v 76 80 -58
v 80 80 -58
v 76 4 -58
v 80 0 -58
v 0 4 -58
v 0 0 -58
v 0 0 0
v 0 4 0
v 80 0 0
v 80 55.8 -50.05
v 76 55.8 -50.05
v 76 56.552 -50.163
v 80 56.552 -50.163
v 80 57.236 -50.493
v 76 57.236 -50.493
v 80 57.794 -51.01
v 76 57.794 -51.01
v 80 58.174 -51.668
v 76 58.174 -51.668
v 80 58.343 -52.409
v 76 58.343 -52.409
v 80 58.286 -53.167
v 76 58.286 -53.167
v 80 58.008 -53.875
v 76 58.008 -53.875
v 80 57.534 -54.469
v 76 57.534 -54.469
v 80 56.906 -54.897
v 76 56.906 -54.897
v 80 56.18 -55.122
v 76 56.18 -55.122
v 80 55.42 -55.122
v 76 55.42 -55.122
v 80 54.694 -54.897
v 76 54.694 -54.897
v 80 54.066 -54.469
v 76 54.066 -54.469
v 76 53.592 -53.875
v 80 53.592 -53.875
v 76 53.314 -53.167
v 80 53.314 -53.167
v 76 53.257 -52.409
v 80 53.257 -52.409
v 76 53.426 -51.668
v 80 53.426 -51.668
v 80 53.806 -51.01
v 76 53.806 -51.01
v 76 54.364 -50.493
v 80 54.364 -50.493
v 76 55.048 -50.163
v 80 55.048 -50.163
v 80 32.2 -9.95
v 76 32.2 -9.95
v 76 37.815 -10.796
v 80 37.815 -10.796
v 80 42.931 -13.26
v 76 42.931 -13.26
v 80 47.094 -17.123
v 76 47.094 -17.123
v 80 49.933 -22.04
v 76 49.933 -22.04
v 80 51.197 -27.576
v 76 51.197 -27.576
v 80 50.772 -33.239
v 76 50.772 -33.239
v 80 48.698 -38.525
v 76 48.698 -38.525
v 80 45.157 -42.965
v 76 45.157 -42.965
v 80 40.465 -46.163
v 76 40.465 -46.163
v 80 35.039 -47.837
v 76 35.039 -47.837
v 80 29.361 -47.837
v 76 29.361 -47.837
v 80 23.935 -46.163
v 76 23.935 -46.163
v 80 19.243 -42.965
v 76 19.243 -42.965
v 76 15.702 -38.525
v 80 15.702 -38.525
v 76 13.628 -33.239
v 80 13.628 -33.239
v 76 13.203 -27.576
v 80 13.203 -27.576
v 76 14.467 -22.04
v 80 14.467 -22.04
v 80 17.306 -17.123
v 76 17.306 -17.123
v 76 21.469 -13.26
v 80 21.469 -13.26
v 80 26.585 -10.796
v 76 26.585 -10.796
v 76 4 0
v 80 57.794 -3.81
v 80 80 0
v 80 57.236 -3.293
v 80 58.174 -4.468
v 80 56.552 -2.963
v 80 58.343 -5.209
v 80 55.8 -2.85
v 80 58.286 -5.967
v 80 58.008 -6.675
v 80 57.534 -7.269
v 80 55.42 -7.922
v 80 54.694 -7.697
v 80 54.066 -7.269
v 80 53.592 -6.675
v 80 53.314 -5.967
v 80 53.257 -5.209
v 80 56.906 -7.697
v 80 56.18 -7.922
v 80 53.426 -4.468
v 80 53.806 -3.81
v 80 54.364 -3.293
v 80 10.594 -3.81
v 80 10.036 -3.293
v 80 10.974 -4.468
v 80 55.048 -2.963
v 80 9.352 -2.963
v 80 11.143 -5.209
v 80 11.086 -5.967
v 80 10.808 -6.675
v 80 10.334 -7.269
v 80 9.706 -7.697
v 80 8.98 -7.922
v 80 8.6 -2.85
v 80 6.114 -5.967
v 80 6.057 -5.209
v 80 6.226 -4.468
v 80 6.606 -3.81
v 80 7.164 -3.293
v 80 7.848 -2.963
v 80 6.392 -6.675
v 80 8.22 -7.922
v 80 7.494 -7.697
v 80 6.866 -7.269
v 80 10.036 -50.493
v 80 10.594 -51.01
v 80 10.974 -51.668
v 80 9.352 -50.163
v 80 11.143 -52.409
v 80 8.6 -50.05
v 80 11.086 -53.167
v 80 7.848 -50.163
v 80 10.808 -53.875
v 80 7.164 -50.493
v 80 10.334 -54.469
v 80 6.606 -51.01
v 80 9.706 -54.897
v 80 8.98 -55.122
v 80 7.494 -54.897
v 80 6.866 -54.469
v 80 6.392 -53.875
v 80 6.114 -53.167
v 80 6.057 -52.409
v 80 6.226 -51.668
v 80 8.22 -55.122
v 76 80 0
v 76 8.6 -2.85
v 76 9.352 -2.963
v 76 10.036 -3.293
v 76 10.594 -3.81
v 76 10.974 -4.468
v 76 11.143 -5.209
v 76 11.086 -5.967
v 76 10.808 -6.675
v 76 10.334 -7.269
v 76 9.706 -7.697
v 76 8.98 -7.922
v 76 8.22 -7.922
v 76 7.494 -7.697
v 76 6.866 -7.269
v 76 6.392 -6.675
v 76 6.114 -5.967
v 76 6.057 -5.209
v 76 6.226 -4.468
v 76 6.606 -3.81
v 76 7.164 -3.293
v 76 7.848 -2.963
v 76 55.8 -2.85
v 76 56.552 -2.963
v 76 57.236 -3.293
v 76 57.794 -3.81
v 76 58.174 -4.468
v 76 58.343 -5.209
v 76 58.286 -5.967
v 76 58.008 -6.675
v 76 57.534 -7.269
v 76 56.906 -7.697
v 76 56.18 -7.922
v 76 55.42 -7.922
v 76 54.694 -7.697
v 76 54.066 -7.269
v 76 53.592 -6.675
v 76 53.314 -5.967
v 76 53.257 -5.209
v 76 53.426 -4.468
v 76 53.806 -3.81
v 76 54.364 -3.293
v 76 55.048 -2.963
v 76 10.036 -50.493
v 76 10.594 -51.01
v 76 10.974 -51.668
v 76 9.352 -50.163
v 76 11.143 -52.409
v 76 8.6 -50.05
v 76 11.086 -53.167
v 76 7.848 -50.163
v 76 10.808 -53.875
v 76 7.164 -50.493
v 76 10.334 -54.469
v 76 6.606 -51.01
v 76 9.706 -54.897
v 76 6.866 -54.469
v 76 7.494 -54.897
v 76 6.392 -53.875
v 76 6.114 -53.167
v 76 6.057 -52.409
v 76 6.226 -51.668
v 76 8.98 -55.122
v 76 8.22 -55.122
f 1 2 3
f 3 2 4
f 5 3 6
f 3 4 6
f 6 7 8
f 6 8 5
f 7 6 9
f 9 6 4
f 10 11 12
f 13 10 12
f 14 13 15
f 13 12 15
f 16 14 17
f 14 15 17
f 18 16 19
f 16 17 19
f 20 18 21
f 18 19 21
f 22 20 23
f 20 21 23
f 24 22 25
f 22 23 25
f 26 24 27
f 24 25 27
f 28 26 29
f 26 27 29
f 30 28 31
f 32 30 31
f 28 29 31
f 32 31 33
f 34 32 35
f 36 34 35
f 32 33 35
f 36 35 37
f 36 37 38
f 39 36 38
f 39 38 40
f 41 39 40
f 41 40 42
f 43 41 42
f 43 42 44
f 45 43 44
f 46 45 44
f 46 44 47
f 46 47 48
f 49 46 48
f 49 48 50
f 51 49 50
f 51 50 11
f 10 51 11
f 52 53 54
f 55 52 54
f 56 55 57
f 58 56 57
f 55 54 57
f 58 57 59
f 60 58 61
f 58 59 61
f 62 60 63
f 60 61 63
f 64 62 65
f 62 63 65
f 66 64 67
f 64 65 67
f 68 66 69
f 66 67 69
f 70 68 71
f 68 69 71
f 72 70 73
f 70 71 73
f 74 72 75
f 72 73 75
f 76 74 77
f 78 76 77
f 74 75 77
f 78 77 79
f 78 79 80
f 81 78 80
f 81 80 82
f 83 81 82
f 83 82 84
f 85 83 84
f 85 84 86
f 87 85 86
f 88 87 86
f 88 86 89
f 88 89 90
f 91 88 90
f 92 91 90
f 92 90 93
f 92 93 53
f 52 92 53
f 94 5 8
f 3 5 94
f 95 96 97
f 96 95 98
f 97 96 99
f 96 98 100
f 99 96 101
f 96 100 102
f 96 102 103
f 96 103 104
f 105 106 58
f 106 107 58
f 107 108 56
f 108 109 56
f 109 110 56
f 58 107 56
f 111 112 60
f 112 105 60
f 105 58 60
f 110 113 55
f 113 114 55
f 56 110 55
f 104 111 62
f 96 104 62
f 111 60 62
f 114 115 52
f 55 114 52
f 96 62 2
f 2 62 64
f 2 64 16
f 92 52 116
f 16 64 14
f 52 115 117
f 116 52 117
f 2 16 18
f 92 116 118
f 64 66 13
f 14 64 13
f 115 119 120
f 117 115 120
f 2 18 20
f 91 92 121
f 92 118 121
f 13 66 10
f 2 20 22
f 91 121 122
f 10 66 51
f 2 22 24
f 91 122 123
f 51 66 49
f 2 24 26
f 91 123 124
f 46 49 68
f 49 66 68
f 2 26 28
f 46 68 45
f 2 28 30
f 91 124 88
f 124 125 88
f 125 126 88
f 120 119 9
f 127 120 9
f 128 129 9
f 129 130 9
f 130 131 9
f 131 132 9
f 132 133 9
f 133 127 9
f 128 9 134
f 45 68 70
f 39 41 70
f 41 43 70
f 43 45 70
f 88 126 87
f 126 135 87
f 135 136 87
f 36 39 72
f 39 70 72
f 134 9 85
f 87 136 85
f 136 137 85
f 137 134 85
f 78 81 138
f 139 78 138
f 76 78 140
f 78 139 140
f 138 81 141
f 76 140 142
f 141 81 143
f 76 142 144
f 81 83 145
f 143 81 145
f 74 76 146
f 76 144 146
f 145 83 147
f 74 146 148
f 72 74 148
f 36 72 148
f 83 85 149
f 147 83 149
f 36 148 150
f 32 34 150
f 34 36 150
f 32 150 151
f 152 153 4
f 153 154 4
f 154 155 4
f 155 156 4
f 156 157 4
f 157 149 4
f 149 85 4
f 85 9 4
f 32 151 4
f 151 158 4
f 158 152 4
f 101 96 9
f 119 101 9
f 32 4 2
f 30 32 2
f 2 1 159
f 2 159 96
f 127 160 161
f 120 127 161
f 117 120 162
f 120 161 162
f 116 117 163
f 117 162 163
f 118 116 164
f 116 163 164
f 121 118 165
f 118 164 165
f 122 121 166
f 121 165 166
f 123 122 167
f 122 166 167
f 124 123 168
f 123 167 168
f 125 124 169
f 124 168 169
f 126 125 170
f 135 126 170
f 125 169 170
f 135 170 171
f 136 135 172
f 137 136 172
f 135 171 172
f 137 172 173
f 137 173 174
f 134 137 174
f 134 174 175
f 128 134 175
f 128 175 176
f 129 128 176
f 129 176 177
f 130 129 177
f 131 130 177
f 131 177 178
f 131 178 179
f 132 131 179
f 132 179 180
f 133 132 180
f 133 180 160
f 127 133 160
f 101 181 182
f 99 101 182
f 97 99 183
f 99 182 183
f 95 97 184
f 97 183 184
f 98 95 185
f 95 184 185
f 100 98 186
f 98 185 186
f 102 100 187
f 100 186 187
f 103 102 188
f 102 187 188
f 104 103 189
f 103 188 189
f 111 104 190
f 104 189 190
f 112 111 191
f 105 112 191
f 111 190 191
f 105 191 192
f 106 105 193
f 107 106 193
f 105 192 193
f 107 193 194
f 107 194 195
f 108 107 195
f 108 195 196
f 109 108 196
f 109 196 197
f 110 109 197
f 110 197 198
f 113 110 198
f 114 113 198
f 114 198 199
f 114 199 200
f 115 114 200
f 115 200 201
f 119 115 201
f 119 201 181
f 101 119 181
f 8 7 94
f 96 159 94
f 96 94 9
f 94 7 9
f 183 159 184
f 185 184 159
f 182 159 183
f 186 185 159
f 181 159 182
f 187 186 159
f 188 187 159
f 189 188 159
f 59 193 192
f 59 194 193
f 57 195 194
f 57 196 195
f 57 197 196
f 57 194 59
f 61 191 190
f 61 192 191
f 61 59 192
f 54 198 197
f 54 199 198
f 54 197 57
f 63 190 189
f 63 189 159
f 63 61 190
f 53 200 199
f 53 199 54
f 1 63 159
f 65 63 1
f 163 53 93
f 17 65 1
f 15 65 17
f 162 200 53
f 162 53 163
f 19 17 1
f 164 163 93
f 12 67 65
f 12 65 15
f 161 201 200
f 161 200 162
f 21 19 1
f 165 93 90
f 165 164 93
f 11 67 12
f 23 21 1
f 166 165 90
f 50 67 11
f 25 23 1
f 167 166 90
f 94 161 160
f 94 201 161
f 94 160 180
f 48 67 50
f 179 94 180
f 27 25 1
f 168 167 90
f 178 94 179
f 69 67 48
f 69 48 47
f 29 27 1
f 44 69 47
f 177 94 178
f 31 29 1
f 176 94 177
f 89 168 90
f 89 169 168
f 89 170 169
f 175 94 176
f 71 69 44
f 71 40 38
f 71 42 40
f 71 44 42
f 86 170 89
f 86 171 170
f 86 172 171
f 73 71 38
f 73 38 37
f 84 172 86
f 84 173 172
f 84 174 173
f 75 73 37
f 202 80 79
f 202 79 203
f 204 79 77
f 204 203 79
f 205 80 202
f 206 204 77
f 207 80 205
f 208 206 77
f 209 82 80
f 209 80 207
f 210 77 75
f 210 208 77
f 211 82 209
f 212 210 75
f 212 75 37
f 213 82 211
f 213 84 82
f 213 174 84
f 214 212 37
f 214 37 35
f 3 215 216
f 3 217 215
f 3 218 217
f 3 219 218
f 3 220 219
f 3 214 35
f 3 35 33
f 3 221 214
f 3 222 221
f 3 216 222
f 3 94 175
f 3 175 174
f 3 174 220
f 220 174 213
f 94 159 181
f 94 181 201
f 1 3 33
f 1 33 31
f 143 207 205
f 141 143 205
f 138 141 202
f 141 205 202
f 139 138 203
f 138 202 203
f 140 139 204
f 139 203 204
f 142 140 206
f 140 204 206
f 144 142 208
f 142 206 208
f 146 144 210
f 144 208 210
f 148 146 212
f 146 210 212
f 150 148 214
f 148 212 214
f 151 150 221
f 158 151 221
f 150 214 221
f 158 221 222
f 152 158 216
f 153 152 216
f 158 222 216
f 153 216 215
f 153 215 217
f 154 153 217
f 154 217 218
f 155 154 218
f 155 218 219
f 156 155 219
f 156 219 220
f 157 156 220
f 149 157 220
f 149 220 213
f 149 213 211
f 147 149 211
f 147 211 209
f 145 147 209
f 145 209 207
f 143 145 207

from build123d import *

# Parameters (mm, degrees)
SKETCH1_W           = 80
SKETCH1_H           = 58
BOSS_EXTRUDE1_DEPTH = 4
SKETCH1_3_W         = 4
SKETCH1_3_H         = 58
BOSS_EXTRUDE2_DEPTH = 80
SKETCH3_R           = 2.55
SKETCH3_R_2         = 19.05
CUT_EXTRUDE1_DEPTH  = 80


with BuildPart() as part:
    # Sketch1 → Boss-Extrude1 (new body)
    with BuildSketch(Plane(origin=(0, 0, 0), x_dir=(1, 0, 0), z_dir=(0, 1, 0))):
        with Locations((40, 29)):
            Rectangle(SKETCH1_W, SKETCH1_H)
    extrude(amount=BOSS_EXTRUDE1_DEPTH)

    # Sketch1<3> → Boss-Extrude2 (add)
    with BuildSketch(Plane(origin=(0, 0, 0), x_dir=(1, 0, 0), z_dir=(0, 1, 0))):
        with Locations((78, 29)):
            Rectangle(SKETCH1_3_W, SKETCH1_3_H)
    extrude(amount=BOSS_EXTRUDE2_DEPTH)

    # Sketch3 → Cut-Extrude1 (cut)
    with BuildSketch(Plane.ZY.offset(-76)):
        with Locations((-52.6, 55.8)):
            Circle(SKETCH3_R)
        with Locations((-5.4, 55.8)):
            Circle(SKETCH3_R)
        with Locations((-52.6, 8.6)):
            Circle(SKETCH3_R)
        with Locations((-5.4, 8.6)):
            Circle(SKETCH3_R)
        with Locations((-29, 32.2)):
            Circle(SKETCH3_R_2)
    extrude(amount=-CUT_EXTRUDE1_DEPTH, mode=Mode.SUBTRACT)


solid = part.part
